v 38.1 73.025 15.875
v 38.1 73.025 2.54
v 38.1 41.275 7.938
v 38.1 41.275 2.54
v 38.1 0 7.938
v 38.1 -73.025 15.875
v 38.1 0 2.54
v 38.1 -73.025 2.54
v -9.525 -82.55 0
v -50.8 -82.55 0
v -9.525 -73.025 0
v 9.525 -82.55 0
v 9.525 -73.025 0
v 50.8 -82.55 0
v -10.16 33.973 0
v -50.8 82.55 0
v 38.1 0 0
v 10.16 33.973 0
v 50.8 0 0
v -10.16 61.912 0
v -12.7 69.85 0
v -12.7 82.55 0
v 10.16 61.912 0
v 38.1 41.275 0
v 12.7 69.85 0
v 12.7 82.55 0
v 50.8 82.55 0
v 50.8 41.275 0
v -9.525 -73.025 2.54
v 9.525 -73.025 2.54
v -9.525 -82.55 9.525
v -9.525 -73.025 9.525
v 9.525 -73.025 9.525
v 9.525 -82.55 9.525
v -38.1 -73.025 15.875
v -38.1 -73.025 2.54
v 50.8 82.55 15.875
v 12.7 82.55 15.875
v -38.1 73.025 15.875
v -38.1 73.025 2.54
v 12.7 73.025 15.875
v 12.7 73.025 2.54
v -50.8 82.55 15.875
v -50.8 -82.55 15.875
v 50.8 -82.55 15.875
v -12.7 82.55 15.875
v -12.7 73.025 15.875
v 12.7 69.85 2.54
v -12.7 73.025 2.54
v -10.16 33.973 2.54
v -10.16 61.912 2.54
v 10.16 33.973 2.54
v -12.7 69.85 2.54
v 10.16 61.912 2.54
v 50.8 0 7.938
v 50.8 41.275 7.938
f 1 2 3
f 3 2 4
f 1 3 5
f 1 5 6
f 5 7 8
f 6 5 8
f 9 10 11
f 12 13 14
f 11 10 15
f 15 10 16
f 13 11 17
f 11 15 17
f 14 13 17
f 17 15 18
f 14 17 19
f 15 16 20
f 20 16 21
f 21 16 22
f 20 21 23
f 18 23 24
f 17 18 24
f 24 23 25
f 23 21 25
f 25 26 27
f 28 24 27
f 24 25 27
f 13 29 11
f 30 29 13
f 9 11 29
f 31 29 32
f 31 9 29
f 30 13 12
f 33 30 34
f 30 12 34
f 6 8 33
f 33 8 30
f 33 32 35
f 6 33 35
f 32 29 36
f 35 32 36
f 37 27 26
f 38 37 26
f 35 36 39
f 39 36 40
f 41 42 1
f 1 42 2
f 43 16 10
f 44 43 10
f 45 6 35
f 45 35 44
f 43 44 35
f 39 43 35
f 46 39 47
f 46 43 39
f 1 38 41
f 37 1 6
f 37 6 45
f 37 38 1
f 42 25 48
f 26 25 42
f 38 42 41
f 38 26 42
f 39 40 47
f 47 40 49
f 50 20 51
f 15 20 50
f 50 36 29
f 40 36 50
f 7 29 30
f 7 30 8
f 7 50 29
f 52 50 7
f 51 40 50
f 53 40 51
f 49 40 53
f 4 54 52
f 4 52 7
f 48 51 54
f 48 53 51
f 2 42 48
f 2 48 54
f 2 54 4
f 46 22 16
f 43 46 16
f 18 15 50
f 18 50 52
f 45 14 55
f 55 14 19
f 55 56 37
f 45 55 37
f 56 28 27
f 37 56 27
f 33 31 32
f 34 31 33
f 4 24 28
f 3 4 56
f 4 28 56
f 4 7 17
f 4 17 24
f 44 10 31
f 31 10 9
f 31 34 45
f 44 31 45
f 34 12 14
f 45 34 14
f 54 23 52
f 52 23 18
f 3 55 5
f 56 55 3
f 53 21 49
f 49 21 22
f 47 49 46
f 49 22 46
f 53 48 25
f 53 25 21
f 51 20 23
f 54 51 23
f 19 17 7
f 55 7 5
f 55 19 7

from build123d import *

# Parameters (mm, degrees)
F0_W      = 12.7
F0_H      = 9.525
F0_W_2    = 76.2
F0_H_2    = 146.05
F1_DEPTH  = 15.875
F2_DEPTH  = 2.54
F3_W      = 19.05
F3_H      = 9.525
F4_DEPTH  = 9.525
F5_W      = 41.275
F5_H      = 7.9375
F6_DEPTH  = 12.7
F7_W      = 20.32
F7_H      = 27.94
F8_DEPTH  = 25.4
F9_W      = 25.4
F9_H      = 15.875
F10_DEPTH = 12.7


with BuildPart() as f1:
    # F0 (on Top) → F1 (new body)
    with BuildSketch(Plane.XY):
        with Locations((44.45, 77.7875)):
            Rectangle(F0_W, F0_H)
        with Locations((-44.45, 77.7875)):
            Rectangle(F0_W, F0_H)
        with Locations((44.45, -77.7875)):
            Rectangle(F0_W, F0_H)
        with Locations((0, -77.7875)):
            Rectangle(F0_W_2, F0_H)
        with Locations((44.45, 0)):
            Rectangle(F0_W, F0_H_2)
        with Locations((-44.45, -77.7875)):
            Rectangle(F0_W, F0_H)
        with Locations((-44.45, 0)):
            Rectangle(F0_W, F0_H_2)
        with Locations((0, 77.7875)):
            Rectangle(F0_W_2, F0_H)
    extrude(amount=F1_DEPTH)

    # F0 (on Top) → F2 (join)
    with BuildSketch(Plane.XY):
        Rectangle(F0_W_2, F0_H_2)
    extrude(amount=F2_DEPTH)

    # F3 (on face) → F4 (cut)
    with BuildSketch(Plane.XZ.offset(82.55)):
        with Locations((0, 4.7625)):
            Rectangle(F3_W, F3_H)
    extrude(amount=-F4_DEPTH, mode=Mode.SUBTRACT)

    # F5 (on face) → F6 (cut)
    with BuildSketch(Plane.YZ.offset(50.8)):
        with Locations((20.6375, 3.96875)):
            Rectangle(F5_W, F5_H)
    extrude(amount=-F6_DEPTH, mode=Mode.SUBTRACT)

    # F7 (on face) → F8 (cut)
    with BuildSketch(Plane(origin=(0, 0, 0), x_dir=(1, 0, 0), z_dir=(0, 0, -1))):
        with Locations((0, -47.9425)):
            Rectangle(F7_W, F7_H)
    extrude(amount=-F8_DEPTH, mode=Mode.SUBTRACT)

    # F9 (on face) → F10 (cut)
    with BuildSketch(Plane(origin=(0, 82.55, 0), x_dir=(-1, 0, 0), z_dir=(0, 1, 0))):
        with Locations((0, 7.9375)):
            Rectangle(F9_W, F9_H)
    extrude(amount=-F10_DEPTH, mode=Mode.SUBTRACT)


solid = f1.part
